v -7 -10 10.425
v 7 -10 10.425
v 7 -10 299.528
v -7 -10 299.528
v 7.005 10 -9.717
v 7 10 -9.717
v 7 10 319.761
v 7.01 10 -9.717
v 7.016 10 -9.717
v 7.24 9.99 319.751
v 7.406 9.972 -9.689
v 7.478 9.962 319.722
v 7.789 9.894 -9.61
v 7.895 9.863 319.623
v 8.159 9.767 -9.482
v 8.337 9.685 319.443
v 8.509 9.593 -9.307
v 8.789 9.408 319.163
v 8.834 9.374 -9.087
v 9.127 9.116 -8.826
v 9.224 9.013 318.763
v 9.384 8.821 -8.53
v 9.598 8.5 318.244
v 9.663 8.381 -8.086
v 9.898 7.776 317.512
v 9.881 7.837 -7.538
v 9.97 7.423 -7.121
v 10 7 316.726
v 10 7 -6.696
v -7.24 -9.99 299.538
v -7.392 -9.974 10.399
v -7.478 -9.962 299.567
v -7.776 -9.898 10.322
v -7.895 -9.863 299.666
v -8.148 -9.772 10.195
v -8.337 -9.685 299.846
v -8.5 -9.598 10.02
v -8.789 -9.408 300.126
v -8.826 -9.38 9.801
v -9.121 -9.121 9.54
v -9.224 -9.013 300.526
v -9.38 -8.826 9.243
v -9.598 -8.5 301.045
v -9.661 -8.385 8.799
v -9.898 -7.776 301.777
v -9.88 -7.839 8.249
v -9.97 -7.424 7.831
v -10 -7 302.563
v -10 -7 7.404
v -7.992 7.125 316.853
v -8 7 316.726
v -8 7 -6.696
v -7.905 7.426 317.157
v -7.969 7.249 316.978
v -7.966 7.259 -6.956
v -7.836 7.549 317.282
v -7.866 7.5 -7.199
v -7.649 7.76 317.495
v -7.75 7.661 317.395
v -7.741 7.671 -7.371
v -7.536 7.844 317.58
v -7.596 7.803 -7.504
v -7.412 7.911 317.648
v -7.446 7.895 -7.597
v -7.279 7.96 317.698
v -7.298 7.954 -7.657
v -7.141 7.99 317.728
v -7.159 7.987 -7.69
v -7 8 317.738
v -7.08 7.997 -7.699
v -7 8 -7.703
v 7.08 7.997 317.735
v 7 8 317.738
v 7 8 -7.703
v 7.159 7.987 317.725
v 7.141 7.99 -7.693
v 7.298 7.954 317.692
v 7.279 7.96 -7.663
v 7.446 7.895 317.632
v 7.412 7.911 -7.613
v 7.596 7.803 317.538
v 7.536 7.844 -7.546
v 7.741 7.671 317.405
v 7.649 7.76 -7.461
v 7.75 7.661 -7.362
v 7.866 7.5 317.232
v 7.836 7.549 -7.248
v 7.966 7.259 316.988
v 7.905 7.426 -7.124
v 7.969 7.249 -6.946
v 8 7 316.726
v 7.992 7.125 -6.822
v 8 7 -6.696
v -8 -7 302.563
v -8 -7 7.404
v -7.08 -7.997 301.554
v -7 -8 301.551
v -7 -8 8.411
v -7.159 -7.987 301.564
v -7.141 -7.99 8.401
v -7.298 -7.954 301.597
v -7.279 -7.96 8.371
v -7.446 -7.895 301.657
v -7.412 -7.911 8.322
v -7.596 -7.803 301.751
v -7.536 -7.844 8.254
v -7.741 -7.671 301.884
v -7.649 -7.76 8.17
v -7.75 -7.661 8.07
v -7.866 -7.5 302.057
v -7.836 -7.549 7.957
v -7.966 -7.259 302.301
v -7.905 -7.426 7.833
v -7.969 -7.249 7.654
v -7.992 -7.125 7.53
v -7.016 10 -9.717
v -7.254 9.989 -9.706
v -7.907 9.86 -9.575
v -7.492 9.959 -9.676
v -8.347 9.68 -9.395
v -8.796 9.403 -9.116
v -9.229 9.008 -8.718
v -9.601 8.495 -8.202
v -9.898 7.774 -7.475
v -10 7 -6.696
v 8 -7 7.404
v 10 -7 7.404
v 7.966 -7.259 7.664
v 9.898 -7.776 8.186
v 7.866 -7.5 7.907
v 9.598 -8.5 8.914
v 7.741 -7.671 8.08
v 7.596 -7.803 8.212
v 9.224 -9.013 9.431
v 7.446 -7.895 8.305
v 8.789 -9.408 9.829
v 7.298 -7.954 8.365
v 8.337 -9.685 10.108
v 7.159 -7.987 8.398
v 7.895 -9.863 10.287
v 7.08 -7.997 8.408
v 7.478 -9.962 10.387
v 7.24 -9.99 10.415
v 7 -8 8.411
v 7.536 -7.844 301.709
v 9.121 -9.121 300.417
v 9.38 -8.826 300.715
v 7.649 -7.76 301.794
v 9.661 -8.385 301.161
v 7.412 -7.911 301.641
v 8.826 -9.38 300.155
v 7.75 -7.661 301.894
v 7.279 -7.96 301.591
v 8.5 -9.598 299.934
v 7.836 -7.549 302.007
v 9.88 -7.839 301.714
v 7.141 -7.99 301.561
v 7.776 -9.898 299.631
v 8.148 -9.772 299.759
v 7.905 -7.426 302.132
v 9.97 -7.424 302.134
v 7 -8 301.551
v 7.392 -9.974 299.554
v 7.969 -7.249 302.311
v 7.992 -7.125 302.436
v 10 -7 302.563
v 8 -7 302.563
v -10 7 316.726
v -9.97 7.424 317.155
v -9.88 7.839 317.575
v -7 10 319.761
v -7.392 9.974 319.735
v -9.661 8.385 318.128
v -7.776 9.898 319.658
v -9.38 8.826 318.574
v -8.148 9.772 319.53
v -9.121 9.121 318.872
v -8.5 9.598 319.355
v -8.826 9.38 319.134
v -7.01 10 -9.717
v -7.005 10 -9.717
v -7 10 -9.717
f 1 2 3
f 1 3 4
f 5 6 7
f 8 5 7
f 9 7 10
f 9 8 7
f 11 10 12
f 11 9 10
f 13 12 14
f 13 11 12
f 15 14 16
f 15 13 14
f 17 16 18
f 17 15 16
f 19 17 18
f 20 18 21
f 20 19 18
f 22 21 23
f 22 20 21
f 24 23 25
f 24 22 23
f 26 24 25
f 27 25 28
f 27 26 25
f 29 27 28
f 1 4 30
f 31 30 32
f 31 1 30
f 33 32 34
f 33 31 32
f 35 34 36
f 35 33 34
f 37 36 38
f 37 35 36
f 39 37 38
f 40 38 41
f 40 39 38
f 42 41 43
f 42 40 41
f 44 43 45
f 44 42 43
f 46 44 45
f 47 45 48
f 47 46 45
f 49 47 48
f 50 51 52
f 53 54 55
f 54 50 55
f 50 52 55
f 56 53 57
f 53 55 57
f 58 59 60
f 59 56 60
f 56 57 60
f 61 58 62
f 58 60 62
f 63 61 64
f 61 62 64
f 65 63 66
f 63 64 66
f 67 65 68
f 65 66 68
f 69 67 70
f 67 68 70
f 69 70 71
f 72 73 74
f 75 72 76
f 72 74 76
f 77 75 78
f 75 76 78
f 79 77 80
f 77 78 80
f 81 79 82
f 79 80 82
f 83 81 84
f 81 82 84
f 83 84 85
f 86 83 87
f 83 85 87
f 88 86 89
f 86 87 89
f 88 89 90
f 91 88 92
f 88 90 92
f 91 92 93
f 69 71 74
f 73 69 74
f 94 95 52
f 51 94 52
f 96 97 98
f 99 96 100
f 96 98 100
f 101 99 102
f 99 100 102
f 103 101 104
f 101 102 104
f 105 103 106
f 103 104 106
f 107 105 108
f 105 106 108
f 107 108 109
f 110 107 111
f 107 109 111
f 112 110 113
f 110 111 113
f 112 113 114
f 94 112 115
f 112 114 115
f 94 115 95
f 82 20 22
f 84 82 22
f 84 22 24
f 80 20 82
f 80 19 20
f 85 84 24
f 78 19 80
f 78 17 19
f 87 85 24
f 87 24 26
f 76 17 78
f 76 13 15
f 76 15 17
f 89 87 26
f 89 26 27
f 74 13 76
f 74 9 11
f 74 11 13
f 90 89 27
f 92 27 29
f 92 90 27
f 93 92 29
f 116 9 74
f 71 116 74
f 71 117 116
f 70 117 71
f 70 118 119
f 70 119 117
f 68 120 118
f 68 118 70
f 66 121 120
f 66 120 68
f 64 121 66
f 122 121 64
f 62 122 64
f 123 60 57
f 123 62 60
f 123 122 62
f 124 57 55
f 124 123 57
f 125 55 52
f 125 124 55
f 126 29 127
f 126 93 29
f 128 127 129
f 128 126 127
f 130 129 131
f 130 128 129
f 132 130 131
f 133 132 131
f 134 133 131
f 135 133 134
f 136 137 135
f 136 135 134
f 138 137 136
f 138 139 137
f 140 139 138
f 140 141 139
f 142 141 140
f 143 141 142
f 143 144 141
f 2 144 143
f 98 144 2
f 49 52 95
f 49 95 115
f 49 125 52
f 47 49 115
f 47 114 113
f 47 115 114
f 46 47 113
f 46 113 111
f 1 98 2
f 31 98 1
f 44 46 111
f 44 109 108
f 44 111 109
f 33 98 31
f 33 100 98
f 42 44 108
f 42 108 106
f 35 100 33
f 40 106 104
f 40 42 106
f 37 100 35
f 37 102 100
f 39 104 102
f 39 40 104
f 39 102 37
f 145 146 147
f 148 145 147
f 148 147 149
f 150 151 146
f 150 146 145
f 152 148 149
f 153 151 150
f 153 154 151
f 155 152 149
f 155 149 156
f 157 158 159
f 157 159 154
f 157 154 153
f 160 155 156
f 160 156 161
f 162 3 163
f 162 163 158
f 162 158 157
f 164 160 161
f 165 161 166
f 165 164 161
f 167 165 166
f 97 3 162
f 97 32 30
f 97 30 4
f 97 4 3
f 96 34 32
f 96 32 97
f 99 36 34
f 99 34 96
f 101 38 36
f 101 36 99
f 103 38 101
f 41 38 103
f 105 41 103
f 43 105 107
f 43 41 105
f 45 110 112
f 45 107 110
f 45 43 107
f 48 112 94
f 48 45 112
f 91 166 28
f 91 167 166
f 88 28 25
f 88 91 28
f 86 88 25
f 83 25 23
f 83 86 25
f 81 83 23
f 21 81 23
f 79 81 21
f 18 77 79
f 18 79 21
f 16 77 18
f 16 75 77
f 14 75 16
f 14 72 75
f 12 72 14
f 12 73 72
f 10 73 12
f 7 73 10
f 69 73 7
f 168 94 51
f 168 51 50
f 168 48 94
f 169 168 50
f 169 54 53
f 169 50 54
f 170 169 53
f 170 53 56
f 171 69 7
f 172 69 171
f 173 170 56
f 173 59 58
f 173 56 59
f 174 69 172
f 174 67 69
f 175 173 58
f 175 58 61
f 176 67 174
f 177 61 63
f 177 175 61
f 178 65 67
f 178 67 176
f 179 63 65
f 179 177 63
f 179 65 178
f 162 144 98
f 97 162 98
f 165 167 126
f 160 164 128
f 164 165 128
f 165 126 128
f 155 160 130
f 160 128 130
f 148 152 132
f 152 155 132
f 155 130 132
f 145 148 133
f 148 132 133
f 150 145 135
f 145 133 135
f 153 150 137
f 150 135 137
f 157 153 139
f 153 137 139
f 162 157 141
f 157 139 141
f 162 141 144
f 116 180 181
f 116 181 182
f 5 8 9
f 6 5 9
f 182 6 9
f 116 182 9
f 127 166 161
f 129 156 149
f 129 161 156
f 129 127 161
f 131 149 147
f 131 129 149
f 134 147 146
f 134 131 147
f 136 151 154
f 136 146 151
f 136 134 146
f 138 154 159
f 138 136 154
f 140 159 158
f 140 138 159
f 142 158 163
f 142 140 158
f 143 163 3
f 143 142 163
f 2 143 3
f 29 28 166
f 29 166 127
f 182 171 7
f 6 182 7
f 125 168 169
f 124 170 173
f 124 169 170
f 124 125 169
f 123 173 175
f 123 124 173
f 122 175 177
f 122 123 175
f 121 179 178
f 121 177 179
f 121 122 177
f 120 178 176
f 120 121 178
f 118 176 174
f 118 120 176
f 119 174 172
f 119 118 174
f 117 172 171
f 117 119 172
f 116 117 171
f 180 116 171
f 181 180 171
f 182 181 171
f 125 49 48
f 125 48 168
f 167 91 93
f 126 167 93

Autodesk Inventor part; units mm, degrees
ref_plane "Start Plane" through (0, 0, -9.7168) normal (0, 0, 1) x (1, 0, 0)
ref_plane "End Plane" through (0, 0, 319.7611) normal (0, 0, 1) x (1, 0, 0)
sketch "Sketch" plane through (0, 0, 0) normal (0, 0, 1) x (1, 0, 0)
  line L0 (-10, -7) -> (-10, 7)
  line L1 (-7, 10) -> (7, 10)
  line L2 (10, 7) -> (10, -7)
  line L3 (7, -10) -> (-7, -10)
  arc A0 (-10, -7) -> (-7, -10) centre (-7, -7) ccw
  arc A1 (-7, 10) -> (-10, 7) centre (-7, 7) ccw
  arc A2 (10, 7) -> (7, 10) centre (7, 7) ccw
  arc A3 (7, -10) -> (10, -7) centre (7, -7) ccw
  arc A4 (-7, 8) -> (-8, 7) centre (-7, 7) ccw
  line L4 (-7, 8) -> (7, 8)
  arc A5 (8, 7) -> (7, 8) centre (7, 7) ccw
  line L5 (8, 7) -> (8, -7)
  arc A6 (7, -8) -> (8, -7) centre (7, -7) ccw
  line L6 (7, -8) -> (-7, -8)
  arc A7 (-8, -7) -> (-7, -8) centre (-7, -7) ccw
  line L7 (-8, -7) -> (-8, 7)
  line L8 (0, 14.8698) -> (0, -14.8698) construction
  line L9 (-14.8698, 0) -> (14.8698, 0) construction
  dimension "d7" = 3
  dimension "d10" = 20
  dimension "d11" = 20
  dimension "d12" = 2
  dimension "d15" = 10
  dimension "d16" = 10
extrude "Body" add sketch "Sketch" along normal up to surface (329.478 mm away) from surface at -9.7168
sketch "Sketch3" plane through (0, 0, 0) normal (0, 0, 1) x (1, 0, 0)
  line L0 (0, 0) -> (10, 0)
ref_plane "Work Plane3" through (0, 0, 0) normal (0, -1, 0) x (1, 0, 0)
sketch "Sketch4" plane through (0, 0, 0) normal (0, -1, 0) x (1, 0, 0)
  line L0 (-2, -9.7168) -> (12, -9.7168)
  line L1 (-2, 319.7611) -> (12, 319.7611)
  dimension "d18" = 329.478
ref_plane "Work Plane4" through (0, 10.1778, 319.941) normal (0, -0.7112, 0.703) x (1, 0, 0)
split "Split1" plane through (0, 10.1778, 319.941) removes the side toward (0, -0.7112, 0.703)
ref_plane "Work Plane5" through (0, 10.1774, -9.8955) normal (0, -0.7096, -0.7046) x (1, 0, 0)
split "Split2" plane through (0, 10.1774, -9.8955) removes the side toward (0, -0.7096, -0.7046)
equation "\"d7\" = G_IR"
equation "\"d10\" = G_H"
equation "\"d11\" = G_W"
equation "\"d12\" = G_T"
equation "\"d15\" = 0.5 * d10"
equation "\"d16\" = 0.5 * d11"
equation "\"d3\" = G_L"
equation "\"G_W\" = 20"
equation "\"G_H\" = 20"
equation "\"G_T\" = 2"
equation "\"G_IR\" = 3"
equation "\"G_L\" = d18"
equation "\"G_OFFSET_START\" = 9.71683"
equation "\"G_OFFSET_END\" = 9.76112"
equation "\"d13\" = -G_OFFSET_START"
equation "\"d14\" = G_OFFSET_END + B_L"
equation "\"B_L\" = 310"
properties part number "ISO 12633-2 - 20x20x2 - 329.48" material "Steel, Mild"
